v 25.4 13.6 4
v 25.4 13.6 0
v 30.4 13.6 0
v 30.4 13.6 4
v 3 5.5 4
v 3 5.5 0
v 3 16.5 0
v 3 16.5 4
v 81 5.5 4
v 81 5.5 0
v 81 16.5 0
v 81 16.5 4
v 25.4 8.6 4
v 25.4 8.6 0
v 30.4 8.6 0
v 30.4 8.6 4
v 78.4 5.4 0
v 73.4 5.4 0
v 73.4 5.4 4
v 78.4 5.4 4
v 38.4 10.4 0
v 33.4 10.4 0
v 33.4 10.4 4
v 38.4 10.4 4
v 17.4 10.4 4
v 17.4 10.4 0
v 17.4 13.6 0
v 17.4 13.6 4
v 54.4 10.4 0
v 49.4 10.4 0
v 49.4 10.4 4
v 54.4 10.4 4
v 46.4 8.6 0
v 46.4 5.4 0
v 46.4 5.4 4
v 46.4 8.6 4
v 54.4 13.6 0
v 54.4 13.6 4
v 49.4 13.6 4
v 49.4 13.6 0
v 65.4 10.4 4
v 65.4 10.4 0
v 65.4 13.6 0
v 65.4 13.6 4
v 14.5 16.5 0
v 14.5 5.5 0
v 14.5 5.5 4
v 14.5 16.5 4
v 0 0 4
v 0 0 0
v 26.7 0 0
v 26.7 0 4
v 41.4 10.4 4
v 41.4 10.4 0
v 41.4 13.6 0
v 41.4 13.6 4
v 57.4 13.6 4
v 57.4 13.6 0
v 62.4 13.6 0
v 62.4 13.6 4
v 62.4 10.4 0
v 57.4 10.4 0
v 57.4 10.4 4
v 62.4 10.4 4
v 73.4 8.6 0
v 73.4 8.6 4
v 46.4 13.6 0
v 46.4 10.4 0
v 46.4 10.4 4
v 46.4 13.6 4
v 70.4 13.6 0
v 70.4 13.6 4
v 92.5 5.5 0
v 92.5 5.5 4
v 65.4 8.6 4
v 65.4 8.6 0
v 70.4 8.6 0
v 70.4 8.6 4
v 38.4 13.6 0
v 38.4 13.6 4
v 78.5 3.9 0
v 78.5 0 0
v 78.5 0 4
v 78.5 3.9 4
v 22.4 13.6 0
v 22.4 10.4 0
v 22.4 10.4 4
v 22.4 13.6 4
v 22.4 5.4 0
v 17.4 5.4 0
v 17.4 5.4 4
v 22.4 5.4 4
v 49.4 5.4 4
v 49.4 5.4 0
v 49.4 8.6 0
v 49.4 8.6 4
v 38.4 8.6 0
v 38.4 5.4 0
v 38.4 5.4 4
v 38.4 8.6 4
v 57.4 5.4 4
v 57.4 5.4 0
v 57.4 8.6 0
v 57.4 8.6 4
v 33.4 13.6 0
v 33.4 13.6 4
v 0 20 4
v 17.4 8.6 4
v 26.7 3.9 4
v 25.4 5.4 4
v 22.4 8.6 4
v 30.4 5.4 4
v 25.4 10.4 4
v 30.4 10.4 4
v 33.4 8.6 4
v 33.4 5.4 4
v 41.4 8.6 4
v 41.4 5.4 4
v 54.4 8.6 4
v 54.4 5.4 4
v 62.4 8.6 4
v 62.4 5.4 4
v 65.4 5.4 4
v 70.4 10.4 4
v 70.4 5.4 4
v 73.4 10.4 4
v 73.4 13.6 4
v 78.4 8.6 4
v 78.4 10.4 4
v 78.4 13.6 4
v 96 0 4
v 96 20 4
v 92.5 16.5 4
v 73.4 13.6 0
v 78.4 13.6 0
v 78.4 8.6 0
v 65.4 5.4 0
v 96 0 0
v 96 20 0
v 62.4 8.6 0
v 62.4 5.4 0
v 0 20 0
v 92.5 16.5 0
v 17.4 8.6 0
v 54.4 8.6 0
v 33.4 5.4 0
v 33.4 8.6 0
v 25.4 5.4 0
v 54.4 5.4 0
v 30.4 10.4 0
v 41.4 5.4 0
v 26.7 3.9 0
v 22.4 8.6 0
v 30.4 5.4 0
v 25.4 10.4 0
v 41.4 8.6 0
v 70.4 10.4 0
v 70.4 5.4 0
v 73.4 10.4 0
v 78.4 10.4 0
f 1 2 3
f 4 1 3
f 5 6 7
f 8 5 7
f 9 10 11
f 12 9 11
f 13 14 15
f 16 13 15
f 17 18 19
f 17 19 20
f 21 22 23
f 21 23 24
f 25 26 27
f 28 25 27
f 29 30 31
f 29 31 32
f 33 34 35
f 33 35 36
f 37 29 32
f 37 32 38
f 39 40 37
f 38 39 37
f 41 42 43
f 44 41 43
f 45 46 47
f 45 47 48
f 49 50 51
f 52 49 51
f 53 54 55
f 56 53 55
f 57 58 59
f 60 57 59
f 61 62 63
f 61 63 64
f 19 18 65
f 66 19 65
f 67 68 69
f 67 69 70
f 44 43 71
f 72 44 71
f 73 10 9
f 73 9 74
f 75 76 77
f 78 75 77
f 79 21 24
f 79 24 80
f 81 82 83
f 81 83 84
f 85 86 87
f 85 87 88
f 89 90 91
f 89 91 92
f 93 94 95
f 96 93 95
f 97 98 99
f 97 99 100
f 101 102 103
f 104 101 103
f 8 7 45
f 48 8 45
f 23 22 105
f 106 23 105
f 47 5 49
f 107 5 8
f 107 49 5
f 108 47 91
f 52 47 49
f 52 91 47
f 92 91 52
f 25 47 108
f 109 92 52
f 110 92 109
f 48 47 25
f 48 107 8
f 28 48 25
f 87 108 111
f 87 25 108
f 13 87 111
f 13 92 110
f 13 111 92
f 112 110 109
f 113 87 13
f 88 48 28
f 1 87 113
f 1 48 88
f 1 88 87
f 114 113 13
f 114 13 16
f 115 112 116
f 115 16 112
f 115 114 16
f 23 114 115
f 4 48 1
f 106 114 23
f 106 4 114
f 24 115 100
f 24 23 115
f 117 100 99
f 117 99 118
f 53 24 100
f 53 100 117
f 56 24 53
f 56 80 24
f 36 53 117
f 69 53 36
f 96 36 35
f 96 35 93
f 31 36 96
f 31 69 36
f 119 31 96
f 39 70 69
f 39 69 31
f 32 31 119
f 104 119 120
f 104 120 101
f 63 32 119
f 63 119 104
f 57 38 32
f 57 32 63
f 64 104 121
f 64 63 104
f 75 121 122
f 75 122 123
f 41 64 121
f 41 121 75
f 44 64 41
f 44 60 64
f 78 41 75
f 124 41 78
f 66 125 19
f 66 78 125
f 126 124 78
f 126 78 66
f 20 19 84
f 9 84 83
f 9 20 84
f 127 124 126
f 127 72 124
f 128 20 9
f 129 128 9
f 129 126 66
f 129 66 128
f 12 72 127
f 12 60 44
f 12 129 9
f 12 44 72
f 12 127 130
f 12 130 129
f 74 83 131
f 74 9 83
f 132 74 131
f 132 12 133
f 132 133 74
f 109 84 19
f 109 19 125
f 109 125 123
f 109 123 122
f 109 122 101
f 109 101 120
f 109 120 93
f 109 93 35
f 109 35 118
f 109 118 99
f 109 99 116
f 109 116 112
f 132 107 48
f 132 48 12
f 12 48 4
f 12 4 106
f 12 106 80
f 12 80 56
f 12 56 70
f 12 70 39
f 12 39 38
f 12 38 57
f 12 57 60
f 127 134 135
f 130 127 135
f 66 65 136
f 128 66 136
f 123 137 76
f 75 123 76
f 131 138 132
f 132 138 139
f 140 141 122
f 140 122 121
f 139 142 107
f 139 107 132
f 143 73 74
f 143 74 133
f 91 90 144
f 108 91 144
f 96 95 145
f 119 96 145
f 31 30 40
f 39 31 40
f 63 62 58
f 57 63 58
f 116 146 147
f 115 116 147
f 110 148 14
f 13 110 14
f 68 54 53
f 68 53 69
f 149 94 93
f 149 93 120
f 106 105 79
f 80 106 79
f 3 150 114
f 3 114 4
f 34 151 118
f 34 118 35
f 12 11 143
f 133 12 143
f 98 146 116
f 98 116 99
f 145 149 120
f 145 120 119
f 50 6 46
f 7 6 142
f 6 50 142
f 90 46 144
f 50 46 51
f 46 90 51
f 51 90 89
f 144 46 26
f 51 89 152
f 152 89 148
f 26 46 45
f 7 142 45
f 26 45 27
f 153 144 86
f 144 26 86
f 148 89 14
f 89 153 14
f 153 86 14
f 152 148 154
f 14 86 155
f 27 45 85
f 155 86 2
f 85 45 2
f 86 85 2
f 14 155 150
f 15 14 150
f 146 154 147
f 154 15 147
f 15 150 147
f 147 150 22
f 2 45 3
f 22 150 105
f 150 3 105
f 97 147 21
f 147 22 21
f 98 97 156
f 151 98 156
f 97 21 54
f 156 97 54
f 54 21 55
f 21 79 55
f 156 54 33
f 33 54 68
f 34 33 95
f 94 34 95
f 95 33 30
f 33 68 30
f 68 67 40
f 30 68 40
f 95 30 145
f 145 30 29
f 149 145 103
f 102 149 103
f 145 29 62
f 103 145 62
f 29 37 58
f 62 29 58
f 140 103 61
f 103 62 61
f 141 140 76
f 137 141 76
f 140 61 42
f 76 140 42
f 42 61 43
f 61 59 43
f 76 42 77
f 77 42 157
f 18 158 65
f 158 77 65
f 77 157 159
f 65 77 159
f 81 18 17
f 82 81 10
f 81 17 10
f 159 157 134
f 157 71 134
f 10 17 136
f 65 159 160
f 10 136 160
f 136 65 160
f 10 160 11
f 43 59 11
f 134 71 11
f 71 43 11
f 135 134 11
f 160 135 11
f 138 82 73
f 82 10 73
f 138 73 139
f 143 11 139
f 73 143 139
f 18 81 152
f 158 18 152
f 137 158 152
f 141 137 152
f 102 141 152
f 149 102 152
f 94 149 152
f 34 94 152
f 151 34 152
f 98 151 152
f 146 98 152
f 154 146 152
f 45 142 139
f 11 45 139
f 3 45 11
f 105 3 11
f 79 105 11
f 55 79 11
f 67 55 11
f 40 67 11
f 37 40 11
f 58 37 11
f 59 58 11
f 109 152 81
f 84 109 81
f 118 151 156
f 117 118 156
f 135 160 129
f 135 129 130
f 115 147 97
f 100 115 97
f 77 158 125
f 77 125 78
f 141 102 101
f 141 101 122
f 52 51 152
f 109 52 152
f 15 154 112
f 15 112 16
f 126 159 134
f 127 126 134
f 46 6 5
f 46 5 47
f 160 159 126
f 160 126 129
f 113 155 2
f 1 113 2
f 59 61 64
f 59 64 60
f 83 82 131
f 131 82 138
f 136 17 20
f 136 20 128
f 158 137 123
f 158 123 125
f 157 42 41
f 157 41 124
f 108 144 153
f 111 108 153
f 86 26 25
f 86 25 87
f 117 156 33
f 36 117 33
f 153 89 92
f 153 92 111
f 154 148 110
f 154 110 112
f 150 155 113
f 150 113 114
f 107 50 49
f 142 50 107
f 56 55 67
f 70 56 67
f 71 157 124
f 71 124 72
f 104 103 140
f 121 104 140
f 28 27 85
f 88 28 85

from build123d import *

# Parameters (mm, degrees)
F0_W     = 96
F0_H     = 20
F2_DEPTH = 4
F1_W     = 11.5
F1_H     = 11
F1_W_2   = 5
F1_H_2   = 3.2
F1_W_3   = 51.8
F1_H_3   = 3.9
F3_DEPTH = 4.001


with BuildPart() as f2:
    # F0 (on Top) → F2 (new body)
    with BuildSketch(Plane.XY):
        with Locations((48, 10)):
            Rectangle(F0_W, F0_H)
    extrude(amount=F2_DEPTH)

    # F1 (on Top) → F3 (cut, through all)
    with BuildSketch(Plane.XY):
        with Locations((8.75, 11)):
            Rectangle(F1_W, F1_H)
        with Locations((86.75, 11)):
            Rectangle(F1_W, F1_H)
        with Locations((19.9, 12)):
            Rectangle(F1_W_2, F1_H_2)
        with Locations((19.9, 7)):
            Rectangle(F1_W_2, F1_H_2)
        with Locations((27.9, 12)):
            Rectangle(F1_W_2, F1_H_2)
        with Locations((27.9, 7)):
            Rectangle(F1_W_2, F1_H_2)
        with Locations((35.9, 12)):
            Rectangle(F1_W_2, F1_H_2)
        with Locations((35.9, 7)):
            Rectangle(F1_W_2, F1_H_2)
        with Locations((43.9, 12)):
            Rectangle(F1_W_2, F1_H_2)
        with Locations((43.9, 7)):
            Rectangle(F1_W_2, F1_H_2)
        with Locations((51.9, 12)):
            Rectangle(F1_W_2, F1_H_2)
        with Locations((51.9, 7)):
            Rectangle(F1_W_2, F1_H_2)
        with Locations((59.9, 12)):
            Rectangle(F1_W_2, F1_H_2)
        with Locations((59.9, 7)):
            Rectangle(F1_W_2, F1_H_2)
        with Locations((67.9, 12)):
            Rectangle(F1_W_2, F1_H_2)
        with Locations((67.9, 7)):
            Rectangle(F1_W_2, F1_H_2)
        with Locations((75.9, 12)):
            Rectangle(F1_W_2, F1_H_2)
        with Locations((75.9, 7)):
            Rectangle(F1_W_2, F1_H_2)
        with Locations((52.6, 1.95)):
            Rectangle(F1_W_3, F1_H_3)
    extrude(amount=F3_DEPTH, mode=Mode.SUBTRACT)


solid = f2.part
